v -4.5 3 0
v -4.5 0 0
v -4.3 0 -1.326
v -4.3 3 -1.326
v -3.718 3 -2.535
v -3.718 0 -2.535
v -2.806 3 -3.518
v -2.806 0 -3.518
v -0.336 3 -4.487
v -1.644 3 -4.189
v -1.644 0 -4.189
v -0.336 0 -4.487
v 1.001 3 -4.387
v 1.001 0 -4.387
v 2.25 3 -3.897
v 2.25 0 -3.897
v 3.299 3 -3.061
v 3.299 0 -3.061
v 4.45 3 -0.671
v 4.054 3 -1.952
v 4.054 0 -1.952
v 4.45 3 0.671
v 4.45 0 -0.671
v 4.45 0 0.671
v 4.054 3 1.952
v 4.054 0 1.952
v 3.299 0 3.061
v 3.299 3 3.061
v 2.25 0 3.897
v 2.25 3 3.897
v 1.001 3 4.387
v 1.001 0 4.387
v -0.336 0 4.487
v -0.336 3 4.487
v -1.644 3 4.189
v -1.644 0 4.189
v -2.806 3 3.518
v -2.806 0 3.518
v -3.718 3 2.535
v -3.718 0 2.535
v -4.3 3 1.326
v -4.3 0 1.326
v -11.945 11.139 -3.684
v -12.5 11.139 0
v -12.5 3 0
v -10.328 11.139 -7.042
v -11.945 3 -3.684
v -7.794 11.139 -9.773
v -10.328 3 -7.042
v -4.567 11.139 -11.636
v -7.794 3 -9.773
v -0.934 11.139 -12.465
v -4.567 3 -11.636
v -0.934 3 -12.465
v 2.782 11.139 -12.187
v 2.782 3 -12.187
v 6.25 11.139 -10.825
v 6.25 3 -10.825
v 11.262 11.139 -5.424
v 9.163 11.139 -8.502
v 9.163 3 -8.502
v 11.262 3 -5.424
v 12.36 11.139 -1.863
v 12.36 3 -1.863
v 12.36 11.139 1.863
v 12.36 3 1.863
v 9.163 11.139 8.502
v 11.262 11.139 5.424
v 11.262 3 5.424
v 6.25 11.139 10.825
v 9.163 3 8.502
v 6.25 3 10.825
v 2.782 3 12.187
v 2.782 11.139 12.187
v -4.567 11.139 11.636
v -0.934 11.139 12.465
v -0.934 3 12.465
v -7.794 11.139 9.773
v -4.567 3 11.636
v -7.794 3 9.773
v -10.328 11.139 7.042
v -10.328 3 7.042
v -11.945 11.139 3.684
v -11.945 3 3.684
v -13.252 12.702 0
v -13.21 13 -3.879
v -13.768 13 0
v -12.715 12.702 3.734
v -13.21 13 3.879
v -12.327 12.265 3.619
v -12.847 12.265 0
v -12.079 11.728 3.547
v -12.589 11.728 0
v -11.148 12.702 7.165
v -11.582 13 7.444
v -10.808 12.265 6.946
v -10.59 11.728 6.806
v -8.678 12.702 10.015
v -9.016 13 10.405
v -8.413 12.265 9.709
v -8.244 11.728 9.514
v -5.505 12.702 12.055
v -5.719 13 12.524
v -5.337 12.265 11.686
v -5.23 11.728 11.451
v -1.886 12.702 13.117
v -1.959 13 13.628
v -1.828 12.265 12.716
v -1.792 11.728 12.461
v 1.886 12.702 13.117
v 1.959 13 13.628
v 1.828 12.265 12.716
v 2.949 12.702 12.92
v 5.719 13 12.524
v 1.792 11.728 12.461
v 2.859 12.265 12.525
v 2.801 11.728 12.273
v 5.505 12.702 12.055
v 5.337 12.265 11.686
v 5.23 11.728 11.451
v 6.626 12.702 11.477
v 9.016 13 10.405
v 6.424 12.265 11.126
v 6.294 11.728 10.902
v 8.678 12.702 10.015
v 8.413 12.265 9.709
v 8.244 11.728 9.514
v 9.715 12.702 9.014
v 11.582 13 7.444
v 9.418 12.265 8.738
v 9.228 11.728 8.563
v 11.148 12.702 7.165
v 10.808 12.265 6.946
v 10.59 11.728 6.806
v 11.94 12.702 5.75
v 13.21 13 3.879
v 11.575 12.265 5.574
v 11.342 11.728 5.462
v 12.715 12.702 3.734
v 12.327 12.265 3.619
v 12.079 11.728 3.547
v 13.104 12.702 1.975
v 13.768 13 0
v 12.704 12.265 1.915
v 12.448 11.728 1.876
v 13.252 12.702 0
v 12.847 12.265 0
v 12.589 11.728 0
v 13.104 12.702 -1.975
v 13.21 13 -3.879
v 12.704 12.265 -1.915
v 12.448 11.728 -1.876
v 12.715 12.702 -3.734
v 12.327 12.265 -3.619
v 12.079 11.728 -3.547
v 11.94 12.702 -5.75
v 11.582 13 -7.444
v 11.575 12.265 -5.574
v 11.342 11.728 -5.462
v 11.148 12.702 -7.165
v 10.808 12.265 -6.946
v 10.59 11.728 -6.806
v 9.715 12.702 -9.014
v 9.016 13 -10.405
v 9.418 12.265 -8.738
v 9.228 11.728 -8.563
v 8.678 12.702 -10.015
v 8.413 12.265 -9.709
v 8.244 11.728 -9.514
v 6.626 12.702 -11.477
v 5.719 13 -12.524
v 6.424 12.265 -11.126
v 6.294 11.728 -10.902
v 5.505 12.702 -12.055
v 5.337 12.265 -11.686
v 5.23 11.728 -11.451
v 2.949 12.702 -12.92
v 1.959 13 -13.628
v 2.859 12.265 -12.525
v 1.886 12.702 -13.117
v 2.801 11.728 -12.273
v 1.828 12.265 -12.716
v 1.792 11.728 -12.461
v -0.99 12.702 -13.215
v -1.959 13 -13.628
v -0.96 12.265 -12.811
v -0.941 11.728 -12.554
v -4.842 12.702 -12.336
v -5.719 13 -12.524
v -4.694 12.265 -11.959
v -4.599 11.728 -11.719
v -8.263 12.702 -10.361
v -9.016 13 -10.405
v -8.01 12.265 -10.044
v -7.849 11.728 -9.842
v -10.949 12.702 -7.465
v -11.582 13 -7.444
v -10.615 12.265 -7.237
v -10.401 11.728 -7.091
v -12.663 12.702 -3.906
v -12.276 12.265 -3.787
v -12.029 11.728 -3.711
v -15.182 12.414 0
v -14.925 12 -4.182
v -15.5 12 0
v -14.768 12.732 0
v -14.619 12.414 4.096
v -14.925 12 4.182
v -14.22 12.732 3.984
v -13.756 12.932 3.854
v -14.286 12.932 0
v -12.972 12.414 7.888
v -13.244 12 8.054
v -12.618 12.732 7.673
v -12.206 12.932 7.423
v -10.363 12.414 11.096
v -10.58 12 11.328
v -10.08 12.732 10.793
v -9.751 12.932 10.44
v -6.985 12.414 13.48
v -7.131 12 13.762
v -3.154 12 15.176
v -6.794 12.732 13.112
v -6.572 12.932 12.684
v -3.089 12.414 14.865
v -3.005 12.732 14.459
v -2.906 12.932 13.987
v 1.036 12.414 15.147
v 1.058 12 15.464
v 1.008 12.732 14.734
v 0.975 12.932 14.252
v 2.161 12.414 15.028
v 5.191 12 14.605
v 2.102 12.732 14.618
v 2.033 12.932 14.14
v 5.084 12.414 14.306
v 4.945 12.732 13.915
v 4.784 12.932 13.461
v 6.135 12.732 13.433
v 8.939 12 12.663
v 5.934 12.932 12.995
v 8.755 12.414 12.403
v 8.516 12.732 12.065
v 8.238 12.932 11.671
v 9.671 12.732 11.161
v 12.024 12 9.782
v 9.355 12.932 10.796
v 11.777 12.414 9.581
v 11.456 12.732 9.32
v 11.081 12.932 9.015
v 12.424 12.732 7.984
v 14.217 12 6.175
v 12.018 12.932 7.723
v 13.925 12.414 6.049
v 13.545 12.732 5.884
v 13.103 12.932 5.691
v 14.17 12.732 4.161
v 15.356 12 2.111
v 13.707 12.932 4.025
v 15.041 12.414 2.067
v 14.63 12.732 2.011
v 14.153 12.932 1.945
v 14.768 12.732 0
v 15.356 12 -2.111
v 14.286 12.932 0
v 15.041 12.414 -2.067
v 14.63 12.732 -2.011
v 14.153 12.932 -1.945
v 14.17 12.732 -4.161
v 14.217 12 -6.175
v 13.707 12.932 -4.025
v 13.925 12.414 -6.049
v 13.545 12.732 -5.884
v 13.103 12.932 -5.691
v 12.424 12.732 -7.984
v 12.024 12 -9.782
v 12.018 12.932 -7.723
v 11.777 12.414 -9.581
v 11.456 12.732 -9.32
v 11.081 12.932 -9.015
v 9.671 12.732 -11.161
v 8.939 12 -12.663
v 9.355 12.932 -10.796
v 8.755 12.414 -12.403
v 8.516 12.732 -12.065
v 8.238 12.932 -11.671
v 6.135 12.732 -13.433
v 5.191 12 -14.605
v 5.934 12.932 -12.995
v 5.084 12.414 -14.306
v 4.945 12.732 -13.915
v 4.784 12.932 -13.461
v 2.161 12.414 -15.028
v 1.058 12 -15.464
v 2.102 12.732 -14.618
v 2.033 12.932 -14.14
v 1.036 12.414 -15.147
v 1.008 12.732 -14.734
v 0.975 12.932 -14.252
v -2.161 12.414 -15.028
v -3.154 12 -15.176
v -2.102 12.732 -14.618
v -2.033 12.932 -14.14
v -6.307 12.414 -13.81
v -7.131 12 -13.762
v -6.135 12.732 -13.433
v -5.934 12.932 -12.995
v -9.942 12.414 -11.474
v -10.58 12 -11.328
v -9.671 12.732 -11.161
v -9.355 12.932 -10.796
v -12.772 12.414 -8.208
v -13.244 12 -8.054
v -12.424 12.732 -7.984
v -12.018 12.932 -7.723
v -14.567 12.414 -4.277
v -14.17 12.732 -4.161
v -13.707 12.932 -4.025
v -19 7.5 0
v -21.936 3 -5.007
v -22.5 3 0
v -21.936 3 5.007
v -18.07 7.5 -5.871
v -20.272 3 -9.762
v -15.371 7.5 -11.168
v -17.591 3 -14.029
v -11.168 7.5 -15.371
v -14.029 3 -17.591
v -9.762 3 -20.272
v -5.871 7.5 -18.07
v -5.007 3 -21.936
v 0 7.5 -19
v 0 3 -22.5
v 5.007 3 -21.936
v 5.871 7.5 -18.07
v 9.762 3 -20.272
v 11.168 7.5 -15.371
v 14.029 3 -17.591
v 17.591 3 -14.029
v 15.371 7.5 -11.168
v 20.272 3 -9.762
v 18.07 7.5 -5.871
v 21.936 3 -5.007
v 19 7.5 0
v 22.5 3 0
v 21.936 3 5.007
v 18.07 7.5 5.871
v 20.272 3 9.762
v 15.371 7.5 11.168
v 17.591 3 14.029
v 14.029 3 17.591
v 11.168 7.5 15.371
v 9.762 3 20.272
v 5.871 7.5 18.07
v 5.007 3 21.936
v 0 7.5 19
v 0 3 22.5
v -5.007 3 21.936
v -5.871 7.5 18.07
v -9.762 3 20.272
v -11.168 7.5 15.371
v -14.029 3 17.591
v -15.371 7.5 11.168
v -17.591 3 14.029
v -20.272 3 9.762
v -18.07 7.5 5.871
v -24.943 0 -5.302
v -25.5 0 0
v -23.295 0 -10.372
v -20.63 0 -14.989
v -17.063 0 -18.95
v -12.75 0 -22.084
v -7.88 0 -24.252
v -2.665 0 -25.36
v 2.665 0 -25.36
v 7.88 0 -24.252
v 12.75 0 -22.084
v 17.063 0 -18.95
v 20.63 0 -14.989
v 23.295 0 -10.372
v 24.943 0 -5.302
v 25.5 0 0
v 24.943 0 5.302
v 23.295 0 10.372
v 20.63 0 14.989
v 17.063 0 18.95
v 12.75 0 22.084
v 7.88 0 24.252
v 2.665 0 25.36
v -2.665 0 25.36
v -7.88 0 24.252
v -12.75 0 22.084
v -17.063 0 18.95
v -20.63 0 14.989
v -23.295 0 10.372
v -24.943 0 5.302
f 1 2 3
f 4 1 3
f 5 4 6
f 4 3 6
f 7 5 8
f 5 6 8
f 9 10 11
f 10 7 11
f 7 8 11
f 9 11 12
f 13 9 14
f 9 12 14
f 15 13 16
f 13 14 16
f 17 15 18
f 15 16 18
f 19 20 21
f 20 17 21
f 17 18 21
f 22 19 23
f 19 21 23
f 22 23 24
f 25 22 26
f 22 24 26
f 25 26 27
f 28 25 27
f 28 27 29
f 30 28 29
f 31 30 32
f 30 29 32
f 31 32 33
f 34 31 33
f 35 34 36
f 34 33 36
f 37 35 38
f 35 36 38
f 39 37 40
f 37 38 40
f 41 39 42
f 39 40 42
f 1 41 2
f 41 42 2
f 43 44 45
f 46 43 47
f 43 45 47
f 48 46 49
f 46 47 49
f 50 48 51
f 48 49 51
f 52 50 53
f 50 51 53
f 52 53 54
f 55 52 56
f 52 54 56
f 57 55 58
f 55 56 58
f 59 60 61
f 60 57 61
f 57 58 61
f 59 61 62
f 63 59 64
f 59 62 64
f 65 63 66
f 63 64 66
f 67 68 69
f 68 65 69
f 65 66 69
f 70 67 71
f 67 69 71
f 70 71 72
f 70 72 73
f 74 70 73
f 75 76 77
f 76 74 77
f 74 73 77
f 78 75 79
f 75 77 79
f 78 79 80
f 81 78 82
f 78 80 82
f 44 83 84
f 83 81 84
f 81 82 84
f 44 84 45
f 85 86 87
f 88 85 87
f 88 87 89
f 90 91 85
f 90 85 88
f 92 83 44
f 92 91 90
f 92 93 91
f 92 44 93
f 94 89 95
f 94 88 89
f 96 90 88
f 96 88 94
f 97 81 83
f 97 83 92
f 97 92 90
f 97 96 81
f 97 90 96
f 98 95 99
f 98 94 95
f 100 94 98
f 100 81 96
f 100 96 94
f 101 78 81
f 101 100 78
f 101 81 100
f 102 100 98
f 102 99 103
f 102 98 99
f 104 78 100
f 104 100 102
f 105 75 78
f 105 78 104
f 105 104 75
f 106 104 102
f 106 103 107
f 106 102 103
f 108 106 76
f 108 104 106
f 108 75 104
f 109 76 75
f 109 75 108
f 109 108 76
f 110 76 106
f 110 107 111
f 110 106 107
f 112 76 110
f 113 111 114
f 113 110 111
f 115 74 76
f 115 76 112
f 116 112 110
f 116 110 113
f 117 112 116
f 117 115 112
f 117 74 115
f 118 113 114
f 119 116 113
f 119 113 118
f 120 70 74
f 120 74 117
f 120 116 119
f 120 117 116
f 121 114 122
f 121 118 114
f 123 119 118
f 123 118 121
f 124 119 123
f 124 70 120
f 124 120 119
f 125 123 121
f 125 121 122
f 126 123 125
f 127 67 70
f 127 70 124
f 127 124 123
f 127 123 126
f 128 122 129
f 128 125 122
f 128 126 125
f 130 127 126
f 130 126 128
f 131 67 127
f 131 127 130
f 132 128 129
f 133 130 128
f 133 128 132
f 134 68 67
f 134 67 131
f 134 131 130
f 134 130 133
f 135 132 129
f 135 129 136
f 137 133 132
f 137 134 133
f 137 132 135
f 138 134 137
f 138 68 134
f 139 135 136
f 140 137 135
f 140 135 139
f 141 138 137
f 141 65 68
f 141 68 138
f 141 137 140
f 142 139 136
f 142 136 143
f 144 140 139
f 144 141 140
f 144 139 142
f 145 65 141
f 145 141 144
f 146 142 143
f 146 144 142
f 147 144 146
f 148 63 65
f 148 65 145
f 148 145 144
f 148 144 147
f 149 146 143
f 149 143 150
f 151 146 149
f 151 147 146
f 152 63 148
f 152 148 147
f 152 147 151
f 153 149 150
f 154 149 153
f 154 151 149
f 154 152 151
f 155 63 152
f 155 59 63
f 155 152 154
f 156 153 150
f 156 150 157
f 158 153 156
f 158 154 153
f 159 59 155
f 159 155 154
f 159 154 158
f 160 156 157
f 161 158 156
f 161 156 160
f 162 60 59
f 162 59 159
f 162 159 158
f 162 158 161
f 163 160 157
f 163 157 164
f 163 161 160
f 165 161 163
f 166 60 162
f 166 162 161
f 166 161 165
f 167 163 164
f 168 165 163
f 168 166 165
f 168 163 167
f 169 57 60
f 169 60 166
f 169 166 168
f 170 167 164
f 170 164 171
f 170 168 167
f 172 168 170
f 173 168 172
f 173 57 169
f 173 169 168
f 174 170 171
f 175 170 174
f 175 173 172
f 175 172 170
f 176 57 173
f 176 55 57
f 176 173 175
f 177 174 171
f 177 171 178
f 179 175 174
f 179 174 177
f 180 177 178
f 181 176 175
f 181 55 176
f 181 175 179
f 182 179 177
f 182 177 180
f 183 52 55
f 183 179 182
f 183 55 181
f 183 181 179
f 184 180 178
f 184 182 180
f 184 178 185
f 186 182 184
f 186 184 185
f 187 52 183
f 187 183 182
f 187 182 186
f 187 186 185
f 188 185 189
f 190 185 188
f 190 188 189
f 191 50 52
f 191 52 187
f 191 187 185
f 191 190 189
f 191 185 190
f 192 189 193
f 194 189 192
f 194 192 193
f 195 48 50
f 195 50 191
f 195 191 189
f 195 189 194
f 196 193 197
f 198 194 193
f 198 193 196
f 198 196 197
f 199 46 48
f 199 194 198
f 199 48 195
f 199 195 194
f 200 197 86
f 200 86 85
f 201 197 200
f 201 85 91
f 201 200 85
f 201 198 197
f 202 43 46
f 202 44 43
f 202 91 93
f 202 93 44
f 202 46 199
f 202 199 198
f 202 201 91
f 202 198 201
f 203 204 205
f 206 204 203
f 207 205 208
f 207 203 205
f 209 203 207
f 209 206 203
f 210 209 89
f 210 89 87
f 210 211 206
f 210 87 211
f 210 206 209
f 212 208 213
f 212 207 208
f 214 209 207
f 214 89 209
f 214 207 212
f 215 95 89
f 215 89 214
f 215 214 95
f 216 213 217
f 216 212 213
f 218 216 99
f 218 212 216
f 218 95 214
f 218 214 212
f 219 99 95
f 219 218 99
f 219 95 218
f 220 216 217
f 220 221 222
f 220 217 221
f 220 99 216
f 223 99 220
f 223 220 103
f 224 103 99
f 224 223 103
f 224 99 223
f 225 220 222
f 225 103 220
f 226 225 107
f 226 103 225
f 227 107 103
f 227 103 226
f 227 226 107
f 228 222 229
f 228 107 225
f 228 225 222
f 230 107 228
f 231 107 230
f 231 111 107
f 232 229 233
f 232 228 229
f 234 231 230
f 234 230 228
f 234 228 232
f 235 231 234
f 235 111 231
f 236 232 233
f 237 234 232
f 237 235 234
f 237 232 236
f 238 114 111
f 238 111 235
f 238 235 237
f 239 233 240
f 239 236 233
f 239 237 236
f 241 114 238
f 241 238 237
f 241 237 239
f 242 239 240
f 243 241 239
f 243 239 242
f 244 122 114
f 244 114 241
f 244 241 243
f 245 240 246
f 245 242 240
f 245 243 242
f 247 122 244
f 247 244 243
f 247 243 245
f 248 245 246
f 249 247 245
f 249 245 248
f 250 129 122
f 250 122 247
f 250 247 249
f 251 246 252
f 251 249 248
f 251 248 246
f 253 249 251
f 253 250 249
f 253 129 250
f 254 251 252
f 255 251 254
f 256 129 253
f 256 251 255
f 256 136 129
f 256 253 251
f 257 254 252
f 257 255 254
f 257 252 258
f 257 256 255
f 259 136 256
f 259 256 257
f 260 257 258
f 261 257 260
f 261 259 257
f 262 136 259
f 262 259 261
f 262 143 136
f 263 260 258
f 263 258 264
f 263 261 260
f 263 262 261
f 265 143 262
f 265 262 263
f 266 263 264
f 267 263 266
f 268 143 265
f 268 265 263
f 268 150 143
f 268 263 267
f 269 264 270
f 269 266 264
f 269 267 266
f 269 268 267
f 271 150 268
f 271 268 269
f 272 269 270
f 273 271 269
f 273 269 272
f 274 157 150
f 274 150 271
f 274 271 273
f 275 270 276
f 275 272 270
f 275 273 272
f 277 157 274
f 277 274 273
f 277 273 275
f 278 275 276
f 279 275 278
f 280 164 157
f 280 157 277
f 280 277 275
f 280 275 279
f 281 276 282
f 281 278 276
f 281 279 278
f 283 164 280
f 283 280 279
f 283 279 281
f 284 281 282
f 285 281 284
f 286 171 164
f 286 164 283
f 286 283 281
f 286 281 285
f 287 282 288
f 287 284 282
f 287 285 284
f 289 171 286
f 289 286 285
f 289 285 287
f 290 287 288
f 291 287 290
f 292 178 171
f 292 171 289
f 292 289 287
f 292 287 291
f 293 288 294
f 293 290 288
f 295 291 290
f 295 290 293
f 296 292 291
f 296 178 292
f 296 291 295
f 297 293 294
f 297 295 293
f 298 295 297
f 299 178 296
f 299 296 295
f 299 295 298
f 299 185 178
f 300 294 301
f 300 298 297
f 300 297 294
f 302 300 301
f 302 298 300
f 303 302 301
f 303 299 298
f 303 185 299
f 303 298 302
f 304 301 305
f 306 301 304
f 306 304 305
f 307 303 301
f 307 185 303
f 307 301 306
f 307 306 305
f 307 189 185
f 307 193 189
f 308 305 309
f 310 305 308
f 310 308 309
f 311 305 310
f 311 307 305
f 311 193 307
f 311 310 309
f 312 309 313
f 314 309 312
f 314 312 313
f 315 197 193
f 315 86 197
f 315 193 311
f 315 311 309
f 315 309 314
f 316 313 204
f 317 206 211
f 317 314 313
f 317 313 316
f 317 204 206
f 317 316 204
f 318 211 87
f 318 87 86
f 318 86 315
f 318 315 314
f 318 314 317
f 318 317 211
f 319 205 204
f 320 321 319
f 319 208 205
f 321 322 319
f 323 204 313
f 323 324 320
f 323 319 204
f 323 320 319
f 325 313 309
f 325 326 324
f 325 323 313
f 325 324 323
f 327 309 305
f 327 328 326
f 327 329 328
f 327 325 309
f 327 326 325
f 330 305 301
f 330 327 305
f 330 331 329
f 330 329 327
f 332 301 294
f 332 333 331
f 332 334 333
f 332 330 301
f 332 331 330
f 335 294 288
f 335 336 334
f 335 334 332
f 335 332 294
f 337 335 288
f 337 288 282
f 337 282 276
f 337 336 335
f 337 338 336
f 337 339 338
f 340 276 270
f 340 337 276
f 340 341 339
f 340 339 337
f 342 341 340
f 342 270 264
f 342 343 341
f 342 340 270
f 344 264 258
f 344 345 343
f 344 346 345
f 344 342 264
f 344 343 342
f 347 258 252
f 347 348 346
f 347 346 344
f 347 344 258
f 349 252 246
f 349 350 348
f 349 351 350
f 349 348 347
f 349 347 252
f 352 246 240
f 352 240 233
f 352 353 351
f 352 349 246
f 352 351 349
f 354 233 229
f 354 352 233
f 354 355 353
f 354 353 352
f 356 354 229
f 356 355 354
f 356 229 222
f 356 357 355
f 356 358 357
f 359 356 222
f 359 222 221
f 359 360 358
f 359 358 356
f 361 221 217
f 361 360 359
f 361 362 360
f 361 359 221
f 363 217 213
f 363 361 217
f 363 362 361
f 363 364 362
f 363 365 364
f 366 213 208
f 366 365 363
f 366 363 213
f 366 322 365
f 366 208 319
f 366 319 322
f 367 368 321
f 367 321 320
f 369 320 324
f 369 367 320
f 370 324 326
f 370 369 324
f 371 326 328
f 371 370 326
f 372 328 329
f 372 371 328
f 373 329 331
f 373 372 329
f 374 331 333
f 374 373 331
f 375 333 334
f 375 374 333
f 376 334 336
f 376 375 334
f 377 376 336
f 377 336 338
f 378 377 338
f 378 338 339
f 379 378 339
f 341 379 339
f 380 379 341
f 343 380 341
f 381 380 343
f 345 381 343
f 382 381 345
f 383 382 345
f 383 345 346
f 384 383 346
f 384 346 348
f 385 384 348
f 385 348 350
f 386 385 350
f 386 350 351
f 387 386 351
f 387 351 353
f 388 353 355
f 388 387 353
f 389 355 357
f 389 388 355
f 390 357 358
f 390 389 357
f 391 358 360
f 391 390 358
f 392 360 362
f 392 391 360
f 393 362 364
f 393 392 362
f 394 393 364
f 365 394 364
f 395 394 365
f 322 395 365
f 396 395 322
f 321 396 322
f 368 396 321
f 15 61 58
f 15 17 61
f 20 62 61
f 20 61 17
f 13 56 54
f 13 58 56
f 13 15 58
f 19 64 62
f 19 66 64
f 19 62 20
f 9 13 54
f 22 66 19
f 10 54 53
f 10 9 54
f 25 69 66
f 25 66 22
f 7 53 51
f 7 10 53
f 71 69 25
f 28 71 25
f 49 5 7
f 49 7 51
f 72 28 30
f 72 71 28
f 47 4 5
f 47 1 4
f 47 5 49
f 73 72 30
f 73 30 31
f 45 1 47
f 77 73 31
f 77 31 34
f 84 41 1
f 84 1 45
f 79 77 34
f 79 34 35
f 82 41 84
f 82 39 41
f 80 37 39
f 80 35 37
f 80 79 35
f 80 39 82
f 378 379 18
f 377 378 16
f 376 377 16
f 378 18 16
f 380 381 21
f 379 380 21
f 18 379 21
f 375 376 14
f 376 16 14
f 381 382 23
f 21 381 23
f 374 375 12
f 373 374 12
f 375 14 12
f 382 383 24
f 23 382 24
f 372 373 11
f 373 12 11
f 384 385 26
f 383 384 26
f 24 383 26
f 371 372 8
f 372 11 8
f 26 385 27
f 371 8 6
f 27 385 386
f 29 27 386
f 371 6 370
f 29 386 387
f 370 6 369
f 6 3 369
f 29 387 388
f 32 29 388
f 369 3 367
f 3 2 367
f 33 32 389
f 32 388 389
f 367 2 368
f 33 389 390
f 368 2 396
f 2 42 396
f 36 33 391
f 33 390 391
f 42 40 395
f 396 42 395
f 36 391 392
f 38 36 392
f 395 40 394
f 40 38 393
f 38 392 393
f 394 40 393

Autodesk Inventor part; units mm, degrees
ref_plane "YZ Plane" through (0, 0, 0) normal (1, 0, 0) x (0, 1, 0)
ref_plane "XZ Plane" through (0, 0, 0) normal (0, 1, 0) x (-1, 0, 0)
ref_plane "XY Plane" through (0, 0, 0) normal (0, 0, 1) x (1, 0, 0)
sketch "Sketch1" plane through (0, 0, 0) normal (0, 1, 0) x (-1, 0, 0)
  circle A0 centre (0, 0) radius 12.5
  circle A1 centre (0, 0) radius 15.5
  circle A2 centre (0, 0) radius 25.5
  circle A3 centre (0, 0) radius 4.5
  dimension "d0" = 25
  dimension "d1" = 31
  dimension "d2" = 51
  dimension "d3" = 9
extrude "Extrusion1" add sketch "Sketch1" along normal blind 3 contours A0 | A1 | A2
chamfer "Chamfer1" distance 3 angle 45 1 edges at (25.5, 3, 0)
extrude "Extrusion2" add sketch "Sketch1" along normal blind 13 contours A1
chamfer "Chamfer2" distance 7 distance2 9 1 edges at (15.5, 3, 0) measured on face at (-19.7987, 3, -3.0313)
fillet "Fillet1" radius 2 2 edges at (15.5, 13, 0) (12.5, 13, 0)
properties part number "boltCap"
